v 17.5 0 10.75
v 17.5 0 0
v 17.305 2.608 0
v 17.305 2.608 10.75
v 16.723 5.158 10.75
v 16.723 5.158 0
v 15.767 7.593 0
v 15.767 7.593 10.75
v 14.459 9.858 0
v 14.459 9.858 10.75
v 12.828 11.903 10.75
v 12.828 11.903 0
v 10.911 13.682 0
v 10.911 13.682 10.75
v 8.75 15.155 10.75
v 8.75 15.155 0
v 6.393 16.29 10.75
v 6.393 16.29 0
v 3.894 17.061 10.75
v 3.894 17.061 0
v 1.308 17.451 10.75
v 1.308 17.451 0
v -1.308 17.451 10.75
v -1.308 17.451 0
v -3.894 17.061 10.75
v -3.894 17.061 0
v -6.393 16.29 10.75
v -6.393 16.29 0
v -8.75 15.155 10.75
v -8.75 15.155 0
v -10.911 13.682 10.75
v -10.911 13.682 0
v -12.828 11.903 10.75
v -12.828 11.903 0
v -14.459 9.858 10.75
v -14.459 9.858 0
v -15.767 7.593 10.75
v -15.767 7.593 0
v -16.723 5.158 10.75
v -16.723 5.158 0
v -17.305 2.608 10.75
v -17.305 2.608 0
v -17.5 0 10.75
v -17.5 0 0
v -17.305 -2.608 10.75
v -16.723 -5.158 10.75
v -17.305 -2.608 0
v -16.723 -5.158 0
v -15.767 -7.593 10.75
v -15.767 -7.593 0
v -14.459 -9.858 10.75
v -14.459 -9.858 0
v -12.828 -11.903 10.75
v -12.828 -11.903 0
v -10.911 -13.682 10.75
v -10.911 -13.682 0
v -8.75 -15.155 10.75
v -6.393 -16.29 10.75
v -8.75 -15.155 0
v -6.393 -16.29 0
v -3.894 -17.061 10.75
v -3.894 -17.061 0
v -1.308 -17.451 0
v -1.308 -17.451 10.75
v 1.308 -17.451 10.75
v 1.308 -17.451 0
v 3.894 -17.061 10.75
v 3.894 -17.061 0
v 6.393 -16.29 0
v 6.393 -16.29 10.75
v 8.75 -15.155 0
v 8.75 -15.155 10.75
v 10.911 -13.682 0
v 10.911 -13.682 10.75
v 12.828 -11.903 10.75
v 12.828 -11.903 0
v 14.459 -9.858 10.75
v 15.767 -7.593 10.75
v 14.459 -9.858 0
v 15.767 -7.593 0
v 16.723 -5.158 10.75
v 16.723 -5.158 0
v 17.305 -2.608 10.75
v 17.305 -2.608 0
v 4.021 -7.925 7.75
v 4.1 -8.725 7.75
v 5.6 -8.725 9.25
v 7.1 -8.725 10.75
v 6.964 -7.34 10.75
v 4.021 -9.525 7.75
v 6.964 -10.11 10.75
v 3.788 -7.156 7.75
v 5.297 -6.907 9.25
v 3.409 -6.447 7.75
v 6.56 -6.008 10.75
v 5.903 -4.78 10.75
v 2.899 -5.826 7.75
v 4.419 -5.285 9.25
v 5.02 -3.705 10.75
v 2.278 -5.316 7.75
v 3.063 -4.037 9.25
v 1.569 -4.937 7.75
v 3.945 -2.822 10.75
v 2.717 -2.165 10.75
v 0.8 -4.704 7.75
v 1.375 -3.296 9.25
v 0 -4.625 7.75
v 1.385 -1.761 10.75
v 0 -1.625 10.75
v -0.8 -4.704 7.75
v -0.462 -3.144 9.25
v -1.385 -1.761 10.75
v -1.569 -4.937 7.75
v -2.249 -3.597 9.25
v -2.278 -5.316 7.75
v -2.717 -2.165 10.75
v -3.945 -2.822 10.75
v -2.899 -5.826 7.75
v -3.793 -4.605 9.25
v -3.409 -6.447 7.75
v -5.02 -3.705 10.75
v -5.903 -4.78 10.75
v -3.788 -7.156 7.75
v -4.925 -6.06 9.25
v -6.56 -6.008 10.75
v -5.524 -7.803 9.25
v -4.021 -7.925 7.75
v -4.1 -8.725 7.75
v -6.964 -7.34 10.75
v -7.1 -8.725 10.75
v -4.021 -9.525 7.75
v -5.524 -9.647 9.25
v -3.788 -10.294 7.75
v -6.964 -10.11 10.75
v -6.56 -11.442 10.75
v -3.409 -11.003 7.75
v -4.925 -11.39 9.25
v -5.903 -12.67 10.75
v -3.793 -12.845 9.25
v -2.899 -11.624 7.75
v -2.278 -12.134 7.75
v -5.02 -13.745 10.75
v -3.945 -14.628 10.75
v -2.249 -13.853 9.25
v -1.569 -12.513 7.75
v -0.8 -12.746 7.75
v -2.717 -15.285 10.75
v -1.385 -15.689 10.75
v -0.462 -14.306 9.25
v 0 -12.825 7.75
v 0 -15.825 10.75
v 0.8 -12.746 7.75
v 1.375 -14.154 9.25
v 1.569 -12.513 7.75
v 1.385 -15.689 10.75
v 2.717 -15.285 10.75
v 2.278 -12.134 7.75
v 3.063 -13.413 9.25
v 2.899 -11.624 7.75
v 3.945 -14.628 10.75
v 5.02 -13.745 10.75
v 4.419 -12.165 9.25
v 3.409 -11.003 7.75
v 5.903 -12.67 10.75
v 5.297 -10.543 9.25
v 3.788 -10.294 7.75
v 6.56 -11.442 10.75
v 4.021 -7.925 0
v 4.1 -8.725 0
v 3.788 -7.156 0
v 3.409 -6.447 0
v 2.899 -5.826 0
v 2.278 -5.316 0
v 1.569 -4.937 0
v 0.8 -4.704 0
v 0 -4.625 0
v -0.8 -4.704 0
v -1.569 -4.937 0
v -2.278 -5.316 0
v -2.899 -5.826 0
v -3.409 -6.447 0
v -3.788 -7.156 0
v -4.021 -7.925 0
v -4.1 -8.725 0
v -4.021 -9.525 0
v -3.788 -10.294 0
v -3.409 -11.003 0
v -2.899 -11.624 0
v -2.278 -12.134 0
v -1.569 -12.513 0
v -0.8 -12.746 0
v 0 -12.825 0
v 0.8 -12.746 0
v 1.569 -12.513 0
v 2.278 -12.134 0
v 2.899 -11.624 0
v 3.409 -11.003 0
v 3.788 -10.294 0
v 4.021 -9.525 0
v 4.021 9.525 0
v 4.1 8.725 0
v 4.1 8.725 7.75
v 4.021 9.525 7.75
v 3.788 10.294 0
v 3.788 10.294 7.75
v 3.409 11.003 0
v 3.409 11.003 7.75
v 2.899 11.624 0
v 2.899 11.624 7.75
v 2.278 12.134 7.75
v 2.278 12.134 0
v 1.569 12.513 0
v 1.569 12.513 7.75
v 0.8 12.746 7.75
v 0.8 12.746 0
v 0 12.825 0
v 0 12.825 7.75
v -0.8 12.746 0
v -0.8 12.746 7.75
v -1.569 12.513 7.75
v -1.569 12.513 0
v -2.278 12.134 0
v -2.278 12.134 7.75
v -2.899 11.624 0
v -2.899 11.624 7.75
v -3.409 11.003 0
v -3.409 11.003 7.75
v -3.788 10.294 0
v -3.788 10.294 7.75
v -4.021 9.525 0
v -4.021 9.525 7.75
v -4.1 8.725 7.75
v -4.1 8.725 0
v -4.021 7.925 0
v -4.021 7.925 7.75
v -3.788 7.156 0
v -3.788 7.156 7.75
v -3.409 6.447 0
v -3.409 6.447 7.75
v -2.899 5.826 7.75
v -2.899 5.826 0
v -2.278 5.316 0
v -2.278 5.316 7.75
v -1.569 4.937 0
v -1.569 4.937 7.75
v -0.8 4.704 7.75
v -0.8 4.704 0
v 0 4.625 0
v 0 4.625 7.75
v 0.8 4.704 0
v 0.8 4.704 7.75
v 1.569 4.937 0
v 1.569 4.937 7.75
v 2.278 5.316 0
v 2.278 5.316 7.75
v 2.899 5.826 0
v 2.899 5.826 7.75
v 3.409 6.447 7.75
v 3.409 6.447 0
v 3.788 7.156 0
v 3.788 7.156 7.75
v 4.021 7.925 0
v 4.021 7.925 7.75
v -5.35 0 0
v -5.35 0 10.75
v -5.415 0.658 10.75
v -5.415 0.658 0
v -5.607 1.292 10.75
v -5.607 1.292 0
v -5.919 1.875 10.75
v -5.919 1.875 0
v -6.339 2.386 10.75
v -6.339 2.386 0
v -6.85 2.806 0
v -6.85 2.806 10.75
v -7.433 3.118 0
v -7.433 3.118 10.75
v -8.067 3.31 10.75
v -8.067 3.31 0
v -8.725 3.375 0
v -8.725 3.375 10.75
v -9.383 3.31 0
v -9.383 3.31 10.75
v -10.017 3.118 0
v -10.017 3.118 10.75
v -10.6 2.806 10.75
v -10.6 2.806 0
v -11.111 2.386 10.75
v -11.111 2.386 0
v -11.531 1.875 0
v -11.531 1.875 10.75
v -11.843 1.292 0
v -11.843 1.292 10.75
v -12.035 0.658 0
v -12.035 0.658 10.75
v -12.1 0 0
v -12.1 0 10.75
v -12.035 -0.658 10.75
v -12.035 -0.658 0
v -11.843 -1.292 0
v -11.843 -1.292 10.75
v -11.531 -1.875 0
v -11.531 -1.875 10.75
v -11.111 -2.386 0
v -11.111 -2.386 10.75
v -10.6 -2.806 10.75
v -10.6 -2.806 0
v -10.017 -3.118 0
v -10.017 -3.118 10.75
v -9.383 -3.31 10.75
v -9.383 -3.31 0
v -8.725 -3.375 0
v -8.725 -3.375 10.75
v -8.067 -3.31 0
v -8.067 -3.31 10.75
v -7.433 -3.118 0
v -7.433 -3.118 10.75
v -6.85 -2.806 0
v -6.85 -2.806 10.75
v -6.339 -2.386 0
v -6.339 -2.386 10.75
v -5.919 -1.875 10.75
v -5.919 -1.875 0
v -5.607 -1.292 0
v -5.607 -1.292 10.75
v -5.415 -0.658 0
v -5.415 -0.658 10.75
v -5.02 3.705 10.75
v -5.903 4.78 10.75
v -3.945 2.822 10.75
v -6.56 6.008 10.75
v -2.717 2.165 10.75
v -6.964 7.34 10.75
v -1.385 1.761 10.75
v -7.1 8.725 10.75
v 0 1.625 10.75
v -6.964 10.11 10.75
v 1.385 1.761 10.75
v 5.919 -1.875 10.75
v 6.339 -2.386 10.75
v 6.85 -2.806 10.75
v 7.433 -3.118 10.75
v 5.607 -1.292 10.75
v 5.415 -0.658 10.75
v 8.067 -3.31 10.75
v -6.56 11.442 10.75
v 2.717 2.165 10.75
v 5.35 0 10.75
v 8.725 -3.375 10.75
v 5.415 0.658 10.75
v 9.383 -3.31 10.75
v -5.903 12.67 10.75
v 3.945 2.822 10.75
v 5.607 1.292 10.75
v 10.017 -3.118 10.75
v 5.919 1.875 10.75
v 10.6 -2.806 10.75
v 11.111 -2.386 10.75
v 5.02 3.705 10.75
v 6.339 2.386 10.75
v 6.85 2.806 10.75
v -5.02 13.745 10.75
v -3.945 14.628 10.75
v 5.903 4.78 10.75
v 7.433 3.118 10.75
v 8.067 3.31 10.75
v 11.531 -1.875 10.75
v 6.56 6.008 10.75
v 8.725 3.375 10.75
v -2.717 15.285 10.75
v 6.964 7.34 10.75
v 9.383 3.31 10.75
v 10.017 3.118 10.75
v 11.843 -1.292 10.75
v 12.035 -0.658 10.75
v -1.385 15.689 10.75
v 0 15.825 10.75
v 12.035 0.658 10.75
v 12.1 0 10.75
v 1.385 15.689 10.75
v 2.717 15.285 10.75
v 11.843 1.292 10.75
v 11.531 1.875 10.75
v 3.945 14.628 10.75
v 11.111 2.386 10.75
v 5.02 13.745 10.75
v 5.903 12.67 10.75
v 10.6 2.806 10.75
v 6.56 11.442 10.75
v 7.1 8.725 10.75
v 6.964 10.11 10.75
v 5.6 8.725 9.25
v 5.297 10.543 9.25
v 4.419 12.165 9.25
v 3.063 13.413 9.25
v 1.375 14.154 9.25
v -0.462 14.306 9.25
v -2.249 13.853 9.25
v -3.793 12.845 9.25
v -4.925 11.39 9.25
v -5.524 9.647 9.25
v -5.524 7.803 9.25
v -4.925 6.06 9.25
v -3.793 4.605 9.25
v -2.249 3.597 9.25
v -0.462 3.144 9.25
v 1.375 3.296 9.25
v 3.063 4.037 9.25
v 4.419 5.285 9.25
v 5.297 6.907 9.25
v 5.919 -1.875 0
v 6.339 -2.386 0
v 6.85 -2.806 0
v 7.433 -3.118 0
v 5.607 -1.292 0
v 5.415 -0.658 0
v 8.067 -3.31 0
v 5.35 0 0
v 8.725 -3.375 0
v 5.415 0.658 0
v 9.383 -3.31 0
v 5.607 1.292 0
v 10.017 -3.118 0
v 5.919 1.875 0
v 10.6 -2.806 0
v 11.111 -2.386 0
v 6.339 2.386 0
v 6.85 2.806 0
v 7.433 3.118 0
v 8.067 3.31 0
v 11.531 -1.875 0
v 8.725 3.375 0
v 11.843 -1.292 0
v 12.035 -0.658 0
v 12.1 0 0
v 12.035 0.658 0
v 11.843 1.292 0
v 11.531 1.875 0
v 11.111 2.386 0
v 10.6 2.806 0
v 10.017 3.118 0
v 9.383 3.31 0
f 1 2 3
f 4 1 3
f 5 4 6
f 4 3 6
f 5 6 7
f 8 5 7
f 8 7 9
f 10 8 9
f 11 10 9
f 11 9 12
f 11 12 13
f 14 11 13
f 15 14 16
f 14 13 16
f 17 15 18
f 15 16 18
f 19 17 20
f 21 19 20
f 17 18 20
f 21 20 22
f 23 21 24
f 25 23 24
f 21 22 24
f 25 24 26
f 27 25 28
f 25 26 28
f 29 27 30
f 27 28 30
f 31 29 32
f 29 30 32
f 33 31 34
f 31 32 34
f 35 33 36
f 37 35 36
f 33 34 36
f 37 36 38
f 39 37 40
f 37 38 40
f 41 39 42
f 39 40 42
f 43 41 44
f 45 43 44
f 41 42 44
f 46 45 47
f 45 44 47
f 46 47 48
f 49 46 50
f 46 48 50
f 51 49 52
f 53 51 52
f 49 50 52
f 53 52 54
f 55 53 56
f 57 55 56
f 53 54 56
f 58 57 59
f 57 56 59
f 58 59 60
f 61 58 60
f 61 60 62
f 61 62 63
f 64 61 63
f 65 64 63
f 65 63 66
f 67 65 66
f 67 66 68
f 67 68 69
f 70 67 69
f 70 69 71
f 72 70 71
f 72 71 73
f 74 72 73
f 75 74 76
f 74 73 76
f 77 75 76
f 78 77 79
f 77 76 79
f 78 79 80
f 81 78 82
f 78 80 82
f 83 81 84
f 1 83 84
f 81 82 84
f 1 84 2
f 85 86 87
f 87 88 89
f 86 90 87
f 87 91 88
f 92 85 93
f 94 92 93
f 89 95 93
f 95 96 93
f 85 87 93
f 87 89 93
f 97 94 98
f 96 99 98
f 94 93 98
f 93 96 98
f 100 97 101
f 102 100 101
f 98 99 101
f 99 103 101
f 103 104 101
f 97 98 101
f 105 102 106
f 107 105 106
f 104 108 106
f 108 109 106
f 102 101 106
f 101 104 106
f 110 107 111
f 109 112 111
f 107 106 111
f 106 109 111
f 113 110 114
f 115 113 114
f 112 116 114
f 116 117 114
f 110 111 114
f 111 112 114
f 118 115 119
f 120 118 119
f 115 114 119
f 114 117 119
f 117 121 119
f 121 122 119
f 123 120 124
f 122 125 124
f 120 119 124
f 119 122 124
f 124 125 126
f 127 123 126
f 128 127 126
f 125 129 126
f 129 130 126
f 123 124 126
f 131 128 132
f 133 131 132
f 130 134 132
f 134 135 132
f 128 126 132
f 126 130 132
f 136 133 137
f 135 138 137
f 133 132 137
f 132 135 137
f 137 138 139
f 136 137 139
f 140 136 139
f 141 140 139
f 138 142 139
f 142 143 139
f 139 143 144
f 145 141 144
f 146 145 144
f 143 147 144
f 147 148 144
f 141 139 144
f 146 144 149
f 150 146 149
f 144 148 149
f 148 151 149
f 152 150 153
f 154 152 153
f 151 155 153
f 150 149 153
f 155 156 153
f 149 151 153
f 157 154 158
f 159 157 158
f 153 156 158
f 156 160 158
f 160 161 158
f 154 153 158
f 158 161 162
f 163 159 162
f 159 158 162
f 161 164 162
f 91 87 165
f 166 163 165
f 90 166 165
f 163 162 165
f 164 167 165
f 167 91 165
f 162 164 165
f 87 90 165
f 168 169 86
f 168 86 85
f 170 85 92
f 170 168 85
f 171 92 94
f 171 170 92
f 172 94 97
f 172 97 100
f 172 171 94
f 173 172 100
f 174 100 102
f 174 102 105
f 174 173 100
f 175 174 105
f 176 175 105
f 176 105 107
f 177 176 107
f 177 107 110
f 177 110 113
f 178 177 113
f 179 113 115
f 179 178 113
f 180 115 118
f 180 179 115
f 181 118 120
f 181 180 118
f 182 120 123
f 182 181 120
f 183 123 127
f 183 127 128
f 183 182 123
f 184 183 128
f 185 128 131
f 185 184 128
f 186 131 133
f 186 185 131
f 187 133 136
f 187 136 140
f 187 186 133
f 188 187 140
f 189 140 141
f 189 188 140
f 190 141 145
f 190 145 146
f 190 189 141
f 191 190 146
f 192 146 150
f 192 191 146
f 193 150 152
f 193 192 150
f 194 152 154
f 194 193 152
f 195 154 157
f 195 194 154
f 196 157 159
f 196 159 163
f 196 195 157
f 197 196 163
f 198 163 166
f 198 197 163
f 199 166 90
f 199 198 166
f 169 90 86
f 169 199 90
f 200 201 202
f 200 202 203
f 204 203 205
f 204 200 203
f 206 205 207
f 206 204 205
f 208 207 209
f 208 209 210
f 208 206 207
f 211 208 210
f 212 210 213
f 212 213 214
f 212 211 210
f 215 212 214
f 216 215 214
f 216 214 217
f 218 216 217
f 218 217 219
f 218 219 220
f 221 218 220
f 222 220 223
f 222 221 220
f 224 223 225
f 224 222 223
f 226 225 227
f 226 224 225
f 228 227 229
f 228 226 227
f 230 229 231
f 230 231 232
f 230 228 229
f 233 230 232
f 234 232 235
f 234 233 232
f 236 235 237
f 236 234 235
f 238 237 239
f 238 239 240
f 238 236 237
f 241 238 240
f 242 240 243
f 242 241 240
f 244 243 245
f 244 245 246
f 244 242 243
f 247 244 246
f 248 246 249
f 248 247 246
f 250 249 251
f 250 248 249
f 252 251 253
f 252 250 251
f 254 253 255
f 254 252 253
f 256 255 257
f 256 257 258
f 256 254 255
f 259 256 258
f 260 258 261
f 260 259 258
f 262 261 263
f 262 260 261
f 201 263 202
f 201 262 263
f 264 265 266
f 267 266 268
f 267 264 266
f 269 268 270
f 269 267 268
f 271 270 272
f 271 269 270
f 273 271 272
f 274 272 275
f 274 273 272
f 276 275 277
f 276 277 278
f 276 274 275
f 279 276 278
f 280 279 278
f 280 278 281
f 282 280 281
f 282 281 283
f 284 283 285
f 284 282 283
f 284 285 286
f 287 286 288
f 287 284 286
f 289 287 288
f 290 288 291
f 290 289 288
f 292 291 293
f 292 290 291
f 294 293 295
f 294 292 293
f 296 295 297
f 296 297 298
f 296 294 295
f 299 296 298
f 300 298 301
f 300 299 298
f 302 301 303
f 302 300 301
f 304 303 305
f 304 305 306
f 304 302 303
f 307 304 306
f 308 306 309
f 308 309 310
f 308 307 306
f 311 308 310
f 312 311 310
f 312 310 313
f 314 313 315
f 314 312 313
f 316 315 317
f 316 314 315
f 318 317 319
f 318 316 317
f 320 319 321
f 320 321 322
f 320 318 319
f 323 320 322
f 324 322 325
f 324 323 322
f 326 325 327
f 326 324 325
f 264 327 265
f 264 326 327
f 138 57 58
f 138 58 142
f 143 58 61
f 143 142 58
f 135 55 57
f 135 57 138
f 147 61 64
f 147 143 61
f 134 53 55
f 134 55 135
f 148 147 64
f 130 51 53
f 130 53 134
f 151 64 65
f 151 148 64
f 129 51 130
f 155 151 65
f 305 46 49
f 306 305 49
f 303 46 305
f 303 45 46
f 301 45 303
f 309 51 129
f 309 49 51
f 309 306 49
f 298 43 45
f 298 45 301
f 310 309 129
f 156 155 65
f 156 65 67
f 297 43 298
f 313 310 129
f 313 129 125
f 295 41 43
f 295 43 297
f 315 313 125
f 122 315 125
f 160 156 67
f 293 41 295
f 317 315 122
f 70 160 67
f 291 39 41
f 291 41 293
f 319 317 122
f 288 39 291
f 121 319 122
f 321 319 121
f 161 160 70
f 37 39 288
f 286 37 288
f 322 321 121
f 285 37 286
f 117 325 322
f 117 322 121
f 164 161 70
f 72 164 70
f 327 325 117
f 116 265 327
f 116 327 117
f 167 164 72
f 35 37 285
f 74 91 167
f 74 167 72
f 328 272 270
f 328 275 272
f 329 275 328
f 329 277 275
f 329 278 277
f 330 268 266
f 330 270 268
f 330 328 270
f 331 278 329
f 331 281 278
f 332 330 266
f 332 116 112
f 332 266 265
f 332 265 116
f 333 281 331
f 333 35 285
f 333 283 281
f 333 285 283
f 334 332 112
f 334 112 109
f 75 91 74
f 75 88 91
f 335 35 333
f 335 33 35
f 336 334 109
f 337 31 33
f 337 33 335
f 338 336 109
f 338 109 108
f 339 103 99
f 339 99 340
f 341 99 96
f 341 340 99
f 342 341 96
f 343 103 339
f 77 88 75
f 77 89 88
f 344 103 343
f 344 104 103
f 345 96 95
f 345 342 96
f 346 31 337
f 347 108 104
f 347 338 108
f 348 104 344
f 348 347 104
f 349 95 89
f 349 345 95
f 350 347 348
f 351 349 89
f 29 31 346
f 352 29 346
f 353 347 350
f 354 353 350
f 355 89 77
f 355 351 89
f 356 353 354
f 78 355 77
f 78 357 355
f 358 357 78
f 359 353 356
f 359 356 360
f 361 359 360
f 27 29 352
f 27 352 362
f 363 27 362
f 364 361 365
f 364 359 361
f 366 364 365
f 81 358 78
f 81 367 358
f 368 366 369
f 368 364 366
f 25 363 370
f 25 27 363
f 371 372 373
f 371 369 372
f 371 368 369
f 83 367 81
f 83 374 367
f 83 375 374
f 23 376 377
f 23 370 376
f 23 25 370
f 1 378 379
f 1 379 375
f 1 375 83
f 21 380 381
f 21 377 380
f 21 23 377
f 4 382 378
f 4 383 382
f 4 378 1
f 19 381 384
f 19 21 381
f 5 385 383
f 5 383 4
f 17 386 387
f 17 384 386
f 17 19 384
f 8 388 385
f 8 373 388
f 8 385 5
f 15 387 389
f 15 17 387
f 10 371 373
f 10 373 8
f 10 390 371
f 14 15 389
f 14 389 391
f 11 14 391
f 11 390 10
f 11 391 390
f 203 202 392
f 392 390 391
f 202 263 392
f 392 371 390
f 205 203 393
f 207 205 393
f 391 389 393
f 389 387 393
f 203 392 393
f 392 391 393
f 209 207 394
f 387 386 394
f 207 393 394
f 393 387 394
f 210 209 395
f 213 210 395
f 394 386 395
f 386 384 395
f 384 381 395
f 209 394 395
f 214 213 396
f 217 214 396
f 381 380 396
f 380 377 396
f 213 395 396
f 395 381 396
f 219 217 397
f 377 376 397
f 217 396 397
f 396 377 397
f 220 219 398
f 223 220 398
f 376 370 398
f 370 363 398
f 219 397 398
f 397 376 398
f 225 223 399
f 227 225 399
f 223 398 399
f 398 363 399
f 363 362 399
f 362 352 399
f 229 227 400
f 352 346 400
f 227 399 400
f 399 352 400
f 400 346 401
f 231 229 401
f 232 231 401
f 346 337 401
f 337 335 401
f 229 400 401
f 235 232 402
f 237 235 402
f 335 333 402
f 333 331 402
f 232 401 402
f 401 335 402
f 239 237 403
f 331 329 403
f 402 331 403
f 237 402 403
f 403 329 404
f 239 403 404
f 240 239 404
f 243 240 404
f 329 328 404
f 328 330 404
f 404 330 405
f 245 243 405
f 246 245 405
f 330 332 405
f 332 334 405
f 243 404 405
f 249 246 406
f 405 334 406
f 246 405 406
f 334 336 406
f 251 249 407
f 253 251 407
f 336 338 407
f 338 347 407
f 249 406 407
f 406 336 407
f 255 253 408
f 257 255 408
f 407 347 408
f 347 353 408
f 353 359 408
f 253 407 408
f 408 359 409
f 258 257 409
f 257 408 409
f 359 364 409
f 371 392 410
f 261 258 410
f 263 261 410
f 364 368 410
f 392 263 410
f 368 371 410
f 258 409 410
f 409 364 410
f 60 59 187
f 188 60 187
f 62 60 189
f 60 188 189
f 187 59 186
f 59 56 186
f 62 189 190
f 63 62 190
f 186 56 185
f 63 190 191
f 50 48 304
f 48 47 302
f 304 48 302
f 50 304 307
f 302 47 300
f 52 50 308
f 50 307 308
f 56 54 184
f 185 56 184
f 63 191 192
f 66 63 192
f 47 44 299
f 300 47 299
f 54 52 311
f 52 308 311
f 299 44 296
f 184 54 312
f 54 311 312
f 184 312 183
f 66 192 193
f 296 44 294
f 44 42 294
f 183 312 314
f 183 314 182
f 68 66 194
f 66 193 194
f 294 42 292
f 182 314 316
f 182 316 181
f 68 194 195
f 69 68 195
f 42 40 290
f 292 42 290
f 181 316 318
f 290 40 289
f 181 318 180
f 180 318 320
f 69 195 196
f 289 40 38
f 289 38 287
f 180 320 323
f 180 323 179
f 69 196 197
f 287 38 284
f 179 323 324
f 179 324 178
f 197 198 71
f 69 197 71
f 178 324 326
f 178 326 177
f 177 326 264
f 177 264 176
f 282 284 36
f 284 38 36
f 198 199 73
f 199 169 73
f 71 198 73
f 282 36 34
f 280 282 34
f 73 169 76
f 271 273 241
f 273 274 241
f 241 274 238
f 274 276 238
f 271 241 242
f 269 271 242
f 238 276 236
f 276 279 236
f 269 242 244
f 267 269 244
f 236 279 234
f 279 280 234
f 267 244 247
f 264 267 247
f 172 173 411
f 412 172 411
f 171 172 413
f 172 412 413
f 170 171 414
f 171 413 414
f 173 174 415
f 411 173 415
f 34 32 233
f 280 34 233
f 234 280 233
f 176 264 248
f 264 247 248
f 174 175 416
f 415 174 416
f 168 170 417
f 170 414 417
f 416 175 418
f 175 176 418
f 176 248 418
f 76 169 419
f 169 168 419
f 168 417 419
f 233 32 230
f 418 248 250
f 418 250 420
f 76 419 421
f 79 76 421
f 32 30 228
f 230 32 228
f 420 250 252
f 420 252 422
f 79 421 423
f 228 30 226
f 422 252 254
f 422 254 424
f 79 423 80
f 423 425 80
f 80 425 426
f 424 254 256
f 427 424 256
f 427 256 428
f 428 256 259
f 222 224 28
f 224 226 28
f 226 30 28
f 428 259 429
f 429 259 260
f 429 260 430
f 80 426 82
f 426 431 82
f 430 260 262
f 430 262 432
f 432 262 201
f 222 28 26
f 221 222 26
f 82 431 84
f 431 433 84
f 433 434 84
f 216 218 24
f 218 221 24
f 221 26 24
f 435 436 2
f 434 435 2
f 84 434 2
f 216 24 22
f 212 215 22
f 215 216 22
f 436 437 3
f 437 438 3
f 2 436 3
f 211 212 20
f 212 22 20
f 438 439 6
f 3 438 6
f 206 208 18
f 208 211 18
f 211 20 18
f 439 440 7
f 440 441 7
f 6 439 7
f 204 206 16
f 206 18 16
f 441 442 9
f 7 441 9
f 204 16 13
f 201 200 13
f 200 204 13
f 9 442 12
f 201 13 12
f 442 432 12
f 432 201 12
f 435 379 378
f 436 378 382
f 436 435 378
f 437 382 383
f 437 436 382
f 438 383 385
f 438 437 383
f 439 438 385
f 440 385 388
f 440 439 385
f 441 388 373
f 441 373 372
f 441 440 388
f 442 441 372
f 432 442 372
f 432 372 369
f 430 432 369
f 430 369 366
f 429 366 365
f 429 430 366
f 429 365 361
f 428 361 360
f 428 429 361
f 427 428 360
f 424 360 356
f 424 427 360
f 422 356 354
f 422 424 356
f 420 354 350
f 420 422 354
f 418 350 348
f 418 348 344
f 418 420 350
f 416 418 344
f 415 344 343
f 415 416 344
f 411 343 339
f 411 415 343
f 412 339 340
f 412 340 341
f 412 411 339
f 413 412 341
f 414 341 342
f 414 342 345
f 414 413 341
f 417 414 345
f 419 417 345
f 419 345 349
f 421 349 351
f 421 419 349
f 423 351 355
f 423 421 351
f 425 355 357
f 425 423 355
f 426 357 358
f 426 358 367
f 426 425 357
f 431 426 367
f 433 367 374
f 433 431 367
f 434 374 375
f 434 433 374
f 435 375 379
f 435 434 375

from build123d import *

# Parameters (mm, degrees)
F0_R     = 17.5
F0_R_2   = 4.1
F0_R_3   = 3.375
F1_DEPTH = 10.75
F2_SIZE  = 3


with BuildPart() as f1:
    # F0 (on Top) → F1 (new body)
    with BuildSketch(Plane.XY):
        Circle(F0_R)
        with Locations((0, -8.725)):
            Circle(F0_R_2, mode=Mode.SUBTRACT)
        with Locations((-8.725, 0)):
            Circle(F0_R_3, mode=Mode.SUBTRACT)
        with Locations((8.725, 0)):
            Circle(F0_R_3, mode=Mode.SUBTRACT)
        with Locations((0, 8.725)):
            Circle(F0_R_2, mode=Mode.SUBTRACT)
    extrude(amount=F1_DEPTH)

    # F2
    f2_edges = [f1.edges().sort_by_distance(p)[0] for p in [
        (-4.1, 8.725, 10.75),
        (-4.1, -8.725, 10.75),
    ]]
    chamfer(f2_edges, length=F2_SIZE)


solid = f1.part
